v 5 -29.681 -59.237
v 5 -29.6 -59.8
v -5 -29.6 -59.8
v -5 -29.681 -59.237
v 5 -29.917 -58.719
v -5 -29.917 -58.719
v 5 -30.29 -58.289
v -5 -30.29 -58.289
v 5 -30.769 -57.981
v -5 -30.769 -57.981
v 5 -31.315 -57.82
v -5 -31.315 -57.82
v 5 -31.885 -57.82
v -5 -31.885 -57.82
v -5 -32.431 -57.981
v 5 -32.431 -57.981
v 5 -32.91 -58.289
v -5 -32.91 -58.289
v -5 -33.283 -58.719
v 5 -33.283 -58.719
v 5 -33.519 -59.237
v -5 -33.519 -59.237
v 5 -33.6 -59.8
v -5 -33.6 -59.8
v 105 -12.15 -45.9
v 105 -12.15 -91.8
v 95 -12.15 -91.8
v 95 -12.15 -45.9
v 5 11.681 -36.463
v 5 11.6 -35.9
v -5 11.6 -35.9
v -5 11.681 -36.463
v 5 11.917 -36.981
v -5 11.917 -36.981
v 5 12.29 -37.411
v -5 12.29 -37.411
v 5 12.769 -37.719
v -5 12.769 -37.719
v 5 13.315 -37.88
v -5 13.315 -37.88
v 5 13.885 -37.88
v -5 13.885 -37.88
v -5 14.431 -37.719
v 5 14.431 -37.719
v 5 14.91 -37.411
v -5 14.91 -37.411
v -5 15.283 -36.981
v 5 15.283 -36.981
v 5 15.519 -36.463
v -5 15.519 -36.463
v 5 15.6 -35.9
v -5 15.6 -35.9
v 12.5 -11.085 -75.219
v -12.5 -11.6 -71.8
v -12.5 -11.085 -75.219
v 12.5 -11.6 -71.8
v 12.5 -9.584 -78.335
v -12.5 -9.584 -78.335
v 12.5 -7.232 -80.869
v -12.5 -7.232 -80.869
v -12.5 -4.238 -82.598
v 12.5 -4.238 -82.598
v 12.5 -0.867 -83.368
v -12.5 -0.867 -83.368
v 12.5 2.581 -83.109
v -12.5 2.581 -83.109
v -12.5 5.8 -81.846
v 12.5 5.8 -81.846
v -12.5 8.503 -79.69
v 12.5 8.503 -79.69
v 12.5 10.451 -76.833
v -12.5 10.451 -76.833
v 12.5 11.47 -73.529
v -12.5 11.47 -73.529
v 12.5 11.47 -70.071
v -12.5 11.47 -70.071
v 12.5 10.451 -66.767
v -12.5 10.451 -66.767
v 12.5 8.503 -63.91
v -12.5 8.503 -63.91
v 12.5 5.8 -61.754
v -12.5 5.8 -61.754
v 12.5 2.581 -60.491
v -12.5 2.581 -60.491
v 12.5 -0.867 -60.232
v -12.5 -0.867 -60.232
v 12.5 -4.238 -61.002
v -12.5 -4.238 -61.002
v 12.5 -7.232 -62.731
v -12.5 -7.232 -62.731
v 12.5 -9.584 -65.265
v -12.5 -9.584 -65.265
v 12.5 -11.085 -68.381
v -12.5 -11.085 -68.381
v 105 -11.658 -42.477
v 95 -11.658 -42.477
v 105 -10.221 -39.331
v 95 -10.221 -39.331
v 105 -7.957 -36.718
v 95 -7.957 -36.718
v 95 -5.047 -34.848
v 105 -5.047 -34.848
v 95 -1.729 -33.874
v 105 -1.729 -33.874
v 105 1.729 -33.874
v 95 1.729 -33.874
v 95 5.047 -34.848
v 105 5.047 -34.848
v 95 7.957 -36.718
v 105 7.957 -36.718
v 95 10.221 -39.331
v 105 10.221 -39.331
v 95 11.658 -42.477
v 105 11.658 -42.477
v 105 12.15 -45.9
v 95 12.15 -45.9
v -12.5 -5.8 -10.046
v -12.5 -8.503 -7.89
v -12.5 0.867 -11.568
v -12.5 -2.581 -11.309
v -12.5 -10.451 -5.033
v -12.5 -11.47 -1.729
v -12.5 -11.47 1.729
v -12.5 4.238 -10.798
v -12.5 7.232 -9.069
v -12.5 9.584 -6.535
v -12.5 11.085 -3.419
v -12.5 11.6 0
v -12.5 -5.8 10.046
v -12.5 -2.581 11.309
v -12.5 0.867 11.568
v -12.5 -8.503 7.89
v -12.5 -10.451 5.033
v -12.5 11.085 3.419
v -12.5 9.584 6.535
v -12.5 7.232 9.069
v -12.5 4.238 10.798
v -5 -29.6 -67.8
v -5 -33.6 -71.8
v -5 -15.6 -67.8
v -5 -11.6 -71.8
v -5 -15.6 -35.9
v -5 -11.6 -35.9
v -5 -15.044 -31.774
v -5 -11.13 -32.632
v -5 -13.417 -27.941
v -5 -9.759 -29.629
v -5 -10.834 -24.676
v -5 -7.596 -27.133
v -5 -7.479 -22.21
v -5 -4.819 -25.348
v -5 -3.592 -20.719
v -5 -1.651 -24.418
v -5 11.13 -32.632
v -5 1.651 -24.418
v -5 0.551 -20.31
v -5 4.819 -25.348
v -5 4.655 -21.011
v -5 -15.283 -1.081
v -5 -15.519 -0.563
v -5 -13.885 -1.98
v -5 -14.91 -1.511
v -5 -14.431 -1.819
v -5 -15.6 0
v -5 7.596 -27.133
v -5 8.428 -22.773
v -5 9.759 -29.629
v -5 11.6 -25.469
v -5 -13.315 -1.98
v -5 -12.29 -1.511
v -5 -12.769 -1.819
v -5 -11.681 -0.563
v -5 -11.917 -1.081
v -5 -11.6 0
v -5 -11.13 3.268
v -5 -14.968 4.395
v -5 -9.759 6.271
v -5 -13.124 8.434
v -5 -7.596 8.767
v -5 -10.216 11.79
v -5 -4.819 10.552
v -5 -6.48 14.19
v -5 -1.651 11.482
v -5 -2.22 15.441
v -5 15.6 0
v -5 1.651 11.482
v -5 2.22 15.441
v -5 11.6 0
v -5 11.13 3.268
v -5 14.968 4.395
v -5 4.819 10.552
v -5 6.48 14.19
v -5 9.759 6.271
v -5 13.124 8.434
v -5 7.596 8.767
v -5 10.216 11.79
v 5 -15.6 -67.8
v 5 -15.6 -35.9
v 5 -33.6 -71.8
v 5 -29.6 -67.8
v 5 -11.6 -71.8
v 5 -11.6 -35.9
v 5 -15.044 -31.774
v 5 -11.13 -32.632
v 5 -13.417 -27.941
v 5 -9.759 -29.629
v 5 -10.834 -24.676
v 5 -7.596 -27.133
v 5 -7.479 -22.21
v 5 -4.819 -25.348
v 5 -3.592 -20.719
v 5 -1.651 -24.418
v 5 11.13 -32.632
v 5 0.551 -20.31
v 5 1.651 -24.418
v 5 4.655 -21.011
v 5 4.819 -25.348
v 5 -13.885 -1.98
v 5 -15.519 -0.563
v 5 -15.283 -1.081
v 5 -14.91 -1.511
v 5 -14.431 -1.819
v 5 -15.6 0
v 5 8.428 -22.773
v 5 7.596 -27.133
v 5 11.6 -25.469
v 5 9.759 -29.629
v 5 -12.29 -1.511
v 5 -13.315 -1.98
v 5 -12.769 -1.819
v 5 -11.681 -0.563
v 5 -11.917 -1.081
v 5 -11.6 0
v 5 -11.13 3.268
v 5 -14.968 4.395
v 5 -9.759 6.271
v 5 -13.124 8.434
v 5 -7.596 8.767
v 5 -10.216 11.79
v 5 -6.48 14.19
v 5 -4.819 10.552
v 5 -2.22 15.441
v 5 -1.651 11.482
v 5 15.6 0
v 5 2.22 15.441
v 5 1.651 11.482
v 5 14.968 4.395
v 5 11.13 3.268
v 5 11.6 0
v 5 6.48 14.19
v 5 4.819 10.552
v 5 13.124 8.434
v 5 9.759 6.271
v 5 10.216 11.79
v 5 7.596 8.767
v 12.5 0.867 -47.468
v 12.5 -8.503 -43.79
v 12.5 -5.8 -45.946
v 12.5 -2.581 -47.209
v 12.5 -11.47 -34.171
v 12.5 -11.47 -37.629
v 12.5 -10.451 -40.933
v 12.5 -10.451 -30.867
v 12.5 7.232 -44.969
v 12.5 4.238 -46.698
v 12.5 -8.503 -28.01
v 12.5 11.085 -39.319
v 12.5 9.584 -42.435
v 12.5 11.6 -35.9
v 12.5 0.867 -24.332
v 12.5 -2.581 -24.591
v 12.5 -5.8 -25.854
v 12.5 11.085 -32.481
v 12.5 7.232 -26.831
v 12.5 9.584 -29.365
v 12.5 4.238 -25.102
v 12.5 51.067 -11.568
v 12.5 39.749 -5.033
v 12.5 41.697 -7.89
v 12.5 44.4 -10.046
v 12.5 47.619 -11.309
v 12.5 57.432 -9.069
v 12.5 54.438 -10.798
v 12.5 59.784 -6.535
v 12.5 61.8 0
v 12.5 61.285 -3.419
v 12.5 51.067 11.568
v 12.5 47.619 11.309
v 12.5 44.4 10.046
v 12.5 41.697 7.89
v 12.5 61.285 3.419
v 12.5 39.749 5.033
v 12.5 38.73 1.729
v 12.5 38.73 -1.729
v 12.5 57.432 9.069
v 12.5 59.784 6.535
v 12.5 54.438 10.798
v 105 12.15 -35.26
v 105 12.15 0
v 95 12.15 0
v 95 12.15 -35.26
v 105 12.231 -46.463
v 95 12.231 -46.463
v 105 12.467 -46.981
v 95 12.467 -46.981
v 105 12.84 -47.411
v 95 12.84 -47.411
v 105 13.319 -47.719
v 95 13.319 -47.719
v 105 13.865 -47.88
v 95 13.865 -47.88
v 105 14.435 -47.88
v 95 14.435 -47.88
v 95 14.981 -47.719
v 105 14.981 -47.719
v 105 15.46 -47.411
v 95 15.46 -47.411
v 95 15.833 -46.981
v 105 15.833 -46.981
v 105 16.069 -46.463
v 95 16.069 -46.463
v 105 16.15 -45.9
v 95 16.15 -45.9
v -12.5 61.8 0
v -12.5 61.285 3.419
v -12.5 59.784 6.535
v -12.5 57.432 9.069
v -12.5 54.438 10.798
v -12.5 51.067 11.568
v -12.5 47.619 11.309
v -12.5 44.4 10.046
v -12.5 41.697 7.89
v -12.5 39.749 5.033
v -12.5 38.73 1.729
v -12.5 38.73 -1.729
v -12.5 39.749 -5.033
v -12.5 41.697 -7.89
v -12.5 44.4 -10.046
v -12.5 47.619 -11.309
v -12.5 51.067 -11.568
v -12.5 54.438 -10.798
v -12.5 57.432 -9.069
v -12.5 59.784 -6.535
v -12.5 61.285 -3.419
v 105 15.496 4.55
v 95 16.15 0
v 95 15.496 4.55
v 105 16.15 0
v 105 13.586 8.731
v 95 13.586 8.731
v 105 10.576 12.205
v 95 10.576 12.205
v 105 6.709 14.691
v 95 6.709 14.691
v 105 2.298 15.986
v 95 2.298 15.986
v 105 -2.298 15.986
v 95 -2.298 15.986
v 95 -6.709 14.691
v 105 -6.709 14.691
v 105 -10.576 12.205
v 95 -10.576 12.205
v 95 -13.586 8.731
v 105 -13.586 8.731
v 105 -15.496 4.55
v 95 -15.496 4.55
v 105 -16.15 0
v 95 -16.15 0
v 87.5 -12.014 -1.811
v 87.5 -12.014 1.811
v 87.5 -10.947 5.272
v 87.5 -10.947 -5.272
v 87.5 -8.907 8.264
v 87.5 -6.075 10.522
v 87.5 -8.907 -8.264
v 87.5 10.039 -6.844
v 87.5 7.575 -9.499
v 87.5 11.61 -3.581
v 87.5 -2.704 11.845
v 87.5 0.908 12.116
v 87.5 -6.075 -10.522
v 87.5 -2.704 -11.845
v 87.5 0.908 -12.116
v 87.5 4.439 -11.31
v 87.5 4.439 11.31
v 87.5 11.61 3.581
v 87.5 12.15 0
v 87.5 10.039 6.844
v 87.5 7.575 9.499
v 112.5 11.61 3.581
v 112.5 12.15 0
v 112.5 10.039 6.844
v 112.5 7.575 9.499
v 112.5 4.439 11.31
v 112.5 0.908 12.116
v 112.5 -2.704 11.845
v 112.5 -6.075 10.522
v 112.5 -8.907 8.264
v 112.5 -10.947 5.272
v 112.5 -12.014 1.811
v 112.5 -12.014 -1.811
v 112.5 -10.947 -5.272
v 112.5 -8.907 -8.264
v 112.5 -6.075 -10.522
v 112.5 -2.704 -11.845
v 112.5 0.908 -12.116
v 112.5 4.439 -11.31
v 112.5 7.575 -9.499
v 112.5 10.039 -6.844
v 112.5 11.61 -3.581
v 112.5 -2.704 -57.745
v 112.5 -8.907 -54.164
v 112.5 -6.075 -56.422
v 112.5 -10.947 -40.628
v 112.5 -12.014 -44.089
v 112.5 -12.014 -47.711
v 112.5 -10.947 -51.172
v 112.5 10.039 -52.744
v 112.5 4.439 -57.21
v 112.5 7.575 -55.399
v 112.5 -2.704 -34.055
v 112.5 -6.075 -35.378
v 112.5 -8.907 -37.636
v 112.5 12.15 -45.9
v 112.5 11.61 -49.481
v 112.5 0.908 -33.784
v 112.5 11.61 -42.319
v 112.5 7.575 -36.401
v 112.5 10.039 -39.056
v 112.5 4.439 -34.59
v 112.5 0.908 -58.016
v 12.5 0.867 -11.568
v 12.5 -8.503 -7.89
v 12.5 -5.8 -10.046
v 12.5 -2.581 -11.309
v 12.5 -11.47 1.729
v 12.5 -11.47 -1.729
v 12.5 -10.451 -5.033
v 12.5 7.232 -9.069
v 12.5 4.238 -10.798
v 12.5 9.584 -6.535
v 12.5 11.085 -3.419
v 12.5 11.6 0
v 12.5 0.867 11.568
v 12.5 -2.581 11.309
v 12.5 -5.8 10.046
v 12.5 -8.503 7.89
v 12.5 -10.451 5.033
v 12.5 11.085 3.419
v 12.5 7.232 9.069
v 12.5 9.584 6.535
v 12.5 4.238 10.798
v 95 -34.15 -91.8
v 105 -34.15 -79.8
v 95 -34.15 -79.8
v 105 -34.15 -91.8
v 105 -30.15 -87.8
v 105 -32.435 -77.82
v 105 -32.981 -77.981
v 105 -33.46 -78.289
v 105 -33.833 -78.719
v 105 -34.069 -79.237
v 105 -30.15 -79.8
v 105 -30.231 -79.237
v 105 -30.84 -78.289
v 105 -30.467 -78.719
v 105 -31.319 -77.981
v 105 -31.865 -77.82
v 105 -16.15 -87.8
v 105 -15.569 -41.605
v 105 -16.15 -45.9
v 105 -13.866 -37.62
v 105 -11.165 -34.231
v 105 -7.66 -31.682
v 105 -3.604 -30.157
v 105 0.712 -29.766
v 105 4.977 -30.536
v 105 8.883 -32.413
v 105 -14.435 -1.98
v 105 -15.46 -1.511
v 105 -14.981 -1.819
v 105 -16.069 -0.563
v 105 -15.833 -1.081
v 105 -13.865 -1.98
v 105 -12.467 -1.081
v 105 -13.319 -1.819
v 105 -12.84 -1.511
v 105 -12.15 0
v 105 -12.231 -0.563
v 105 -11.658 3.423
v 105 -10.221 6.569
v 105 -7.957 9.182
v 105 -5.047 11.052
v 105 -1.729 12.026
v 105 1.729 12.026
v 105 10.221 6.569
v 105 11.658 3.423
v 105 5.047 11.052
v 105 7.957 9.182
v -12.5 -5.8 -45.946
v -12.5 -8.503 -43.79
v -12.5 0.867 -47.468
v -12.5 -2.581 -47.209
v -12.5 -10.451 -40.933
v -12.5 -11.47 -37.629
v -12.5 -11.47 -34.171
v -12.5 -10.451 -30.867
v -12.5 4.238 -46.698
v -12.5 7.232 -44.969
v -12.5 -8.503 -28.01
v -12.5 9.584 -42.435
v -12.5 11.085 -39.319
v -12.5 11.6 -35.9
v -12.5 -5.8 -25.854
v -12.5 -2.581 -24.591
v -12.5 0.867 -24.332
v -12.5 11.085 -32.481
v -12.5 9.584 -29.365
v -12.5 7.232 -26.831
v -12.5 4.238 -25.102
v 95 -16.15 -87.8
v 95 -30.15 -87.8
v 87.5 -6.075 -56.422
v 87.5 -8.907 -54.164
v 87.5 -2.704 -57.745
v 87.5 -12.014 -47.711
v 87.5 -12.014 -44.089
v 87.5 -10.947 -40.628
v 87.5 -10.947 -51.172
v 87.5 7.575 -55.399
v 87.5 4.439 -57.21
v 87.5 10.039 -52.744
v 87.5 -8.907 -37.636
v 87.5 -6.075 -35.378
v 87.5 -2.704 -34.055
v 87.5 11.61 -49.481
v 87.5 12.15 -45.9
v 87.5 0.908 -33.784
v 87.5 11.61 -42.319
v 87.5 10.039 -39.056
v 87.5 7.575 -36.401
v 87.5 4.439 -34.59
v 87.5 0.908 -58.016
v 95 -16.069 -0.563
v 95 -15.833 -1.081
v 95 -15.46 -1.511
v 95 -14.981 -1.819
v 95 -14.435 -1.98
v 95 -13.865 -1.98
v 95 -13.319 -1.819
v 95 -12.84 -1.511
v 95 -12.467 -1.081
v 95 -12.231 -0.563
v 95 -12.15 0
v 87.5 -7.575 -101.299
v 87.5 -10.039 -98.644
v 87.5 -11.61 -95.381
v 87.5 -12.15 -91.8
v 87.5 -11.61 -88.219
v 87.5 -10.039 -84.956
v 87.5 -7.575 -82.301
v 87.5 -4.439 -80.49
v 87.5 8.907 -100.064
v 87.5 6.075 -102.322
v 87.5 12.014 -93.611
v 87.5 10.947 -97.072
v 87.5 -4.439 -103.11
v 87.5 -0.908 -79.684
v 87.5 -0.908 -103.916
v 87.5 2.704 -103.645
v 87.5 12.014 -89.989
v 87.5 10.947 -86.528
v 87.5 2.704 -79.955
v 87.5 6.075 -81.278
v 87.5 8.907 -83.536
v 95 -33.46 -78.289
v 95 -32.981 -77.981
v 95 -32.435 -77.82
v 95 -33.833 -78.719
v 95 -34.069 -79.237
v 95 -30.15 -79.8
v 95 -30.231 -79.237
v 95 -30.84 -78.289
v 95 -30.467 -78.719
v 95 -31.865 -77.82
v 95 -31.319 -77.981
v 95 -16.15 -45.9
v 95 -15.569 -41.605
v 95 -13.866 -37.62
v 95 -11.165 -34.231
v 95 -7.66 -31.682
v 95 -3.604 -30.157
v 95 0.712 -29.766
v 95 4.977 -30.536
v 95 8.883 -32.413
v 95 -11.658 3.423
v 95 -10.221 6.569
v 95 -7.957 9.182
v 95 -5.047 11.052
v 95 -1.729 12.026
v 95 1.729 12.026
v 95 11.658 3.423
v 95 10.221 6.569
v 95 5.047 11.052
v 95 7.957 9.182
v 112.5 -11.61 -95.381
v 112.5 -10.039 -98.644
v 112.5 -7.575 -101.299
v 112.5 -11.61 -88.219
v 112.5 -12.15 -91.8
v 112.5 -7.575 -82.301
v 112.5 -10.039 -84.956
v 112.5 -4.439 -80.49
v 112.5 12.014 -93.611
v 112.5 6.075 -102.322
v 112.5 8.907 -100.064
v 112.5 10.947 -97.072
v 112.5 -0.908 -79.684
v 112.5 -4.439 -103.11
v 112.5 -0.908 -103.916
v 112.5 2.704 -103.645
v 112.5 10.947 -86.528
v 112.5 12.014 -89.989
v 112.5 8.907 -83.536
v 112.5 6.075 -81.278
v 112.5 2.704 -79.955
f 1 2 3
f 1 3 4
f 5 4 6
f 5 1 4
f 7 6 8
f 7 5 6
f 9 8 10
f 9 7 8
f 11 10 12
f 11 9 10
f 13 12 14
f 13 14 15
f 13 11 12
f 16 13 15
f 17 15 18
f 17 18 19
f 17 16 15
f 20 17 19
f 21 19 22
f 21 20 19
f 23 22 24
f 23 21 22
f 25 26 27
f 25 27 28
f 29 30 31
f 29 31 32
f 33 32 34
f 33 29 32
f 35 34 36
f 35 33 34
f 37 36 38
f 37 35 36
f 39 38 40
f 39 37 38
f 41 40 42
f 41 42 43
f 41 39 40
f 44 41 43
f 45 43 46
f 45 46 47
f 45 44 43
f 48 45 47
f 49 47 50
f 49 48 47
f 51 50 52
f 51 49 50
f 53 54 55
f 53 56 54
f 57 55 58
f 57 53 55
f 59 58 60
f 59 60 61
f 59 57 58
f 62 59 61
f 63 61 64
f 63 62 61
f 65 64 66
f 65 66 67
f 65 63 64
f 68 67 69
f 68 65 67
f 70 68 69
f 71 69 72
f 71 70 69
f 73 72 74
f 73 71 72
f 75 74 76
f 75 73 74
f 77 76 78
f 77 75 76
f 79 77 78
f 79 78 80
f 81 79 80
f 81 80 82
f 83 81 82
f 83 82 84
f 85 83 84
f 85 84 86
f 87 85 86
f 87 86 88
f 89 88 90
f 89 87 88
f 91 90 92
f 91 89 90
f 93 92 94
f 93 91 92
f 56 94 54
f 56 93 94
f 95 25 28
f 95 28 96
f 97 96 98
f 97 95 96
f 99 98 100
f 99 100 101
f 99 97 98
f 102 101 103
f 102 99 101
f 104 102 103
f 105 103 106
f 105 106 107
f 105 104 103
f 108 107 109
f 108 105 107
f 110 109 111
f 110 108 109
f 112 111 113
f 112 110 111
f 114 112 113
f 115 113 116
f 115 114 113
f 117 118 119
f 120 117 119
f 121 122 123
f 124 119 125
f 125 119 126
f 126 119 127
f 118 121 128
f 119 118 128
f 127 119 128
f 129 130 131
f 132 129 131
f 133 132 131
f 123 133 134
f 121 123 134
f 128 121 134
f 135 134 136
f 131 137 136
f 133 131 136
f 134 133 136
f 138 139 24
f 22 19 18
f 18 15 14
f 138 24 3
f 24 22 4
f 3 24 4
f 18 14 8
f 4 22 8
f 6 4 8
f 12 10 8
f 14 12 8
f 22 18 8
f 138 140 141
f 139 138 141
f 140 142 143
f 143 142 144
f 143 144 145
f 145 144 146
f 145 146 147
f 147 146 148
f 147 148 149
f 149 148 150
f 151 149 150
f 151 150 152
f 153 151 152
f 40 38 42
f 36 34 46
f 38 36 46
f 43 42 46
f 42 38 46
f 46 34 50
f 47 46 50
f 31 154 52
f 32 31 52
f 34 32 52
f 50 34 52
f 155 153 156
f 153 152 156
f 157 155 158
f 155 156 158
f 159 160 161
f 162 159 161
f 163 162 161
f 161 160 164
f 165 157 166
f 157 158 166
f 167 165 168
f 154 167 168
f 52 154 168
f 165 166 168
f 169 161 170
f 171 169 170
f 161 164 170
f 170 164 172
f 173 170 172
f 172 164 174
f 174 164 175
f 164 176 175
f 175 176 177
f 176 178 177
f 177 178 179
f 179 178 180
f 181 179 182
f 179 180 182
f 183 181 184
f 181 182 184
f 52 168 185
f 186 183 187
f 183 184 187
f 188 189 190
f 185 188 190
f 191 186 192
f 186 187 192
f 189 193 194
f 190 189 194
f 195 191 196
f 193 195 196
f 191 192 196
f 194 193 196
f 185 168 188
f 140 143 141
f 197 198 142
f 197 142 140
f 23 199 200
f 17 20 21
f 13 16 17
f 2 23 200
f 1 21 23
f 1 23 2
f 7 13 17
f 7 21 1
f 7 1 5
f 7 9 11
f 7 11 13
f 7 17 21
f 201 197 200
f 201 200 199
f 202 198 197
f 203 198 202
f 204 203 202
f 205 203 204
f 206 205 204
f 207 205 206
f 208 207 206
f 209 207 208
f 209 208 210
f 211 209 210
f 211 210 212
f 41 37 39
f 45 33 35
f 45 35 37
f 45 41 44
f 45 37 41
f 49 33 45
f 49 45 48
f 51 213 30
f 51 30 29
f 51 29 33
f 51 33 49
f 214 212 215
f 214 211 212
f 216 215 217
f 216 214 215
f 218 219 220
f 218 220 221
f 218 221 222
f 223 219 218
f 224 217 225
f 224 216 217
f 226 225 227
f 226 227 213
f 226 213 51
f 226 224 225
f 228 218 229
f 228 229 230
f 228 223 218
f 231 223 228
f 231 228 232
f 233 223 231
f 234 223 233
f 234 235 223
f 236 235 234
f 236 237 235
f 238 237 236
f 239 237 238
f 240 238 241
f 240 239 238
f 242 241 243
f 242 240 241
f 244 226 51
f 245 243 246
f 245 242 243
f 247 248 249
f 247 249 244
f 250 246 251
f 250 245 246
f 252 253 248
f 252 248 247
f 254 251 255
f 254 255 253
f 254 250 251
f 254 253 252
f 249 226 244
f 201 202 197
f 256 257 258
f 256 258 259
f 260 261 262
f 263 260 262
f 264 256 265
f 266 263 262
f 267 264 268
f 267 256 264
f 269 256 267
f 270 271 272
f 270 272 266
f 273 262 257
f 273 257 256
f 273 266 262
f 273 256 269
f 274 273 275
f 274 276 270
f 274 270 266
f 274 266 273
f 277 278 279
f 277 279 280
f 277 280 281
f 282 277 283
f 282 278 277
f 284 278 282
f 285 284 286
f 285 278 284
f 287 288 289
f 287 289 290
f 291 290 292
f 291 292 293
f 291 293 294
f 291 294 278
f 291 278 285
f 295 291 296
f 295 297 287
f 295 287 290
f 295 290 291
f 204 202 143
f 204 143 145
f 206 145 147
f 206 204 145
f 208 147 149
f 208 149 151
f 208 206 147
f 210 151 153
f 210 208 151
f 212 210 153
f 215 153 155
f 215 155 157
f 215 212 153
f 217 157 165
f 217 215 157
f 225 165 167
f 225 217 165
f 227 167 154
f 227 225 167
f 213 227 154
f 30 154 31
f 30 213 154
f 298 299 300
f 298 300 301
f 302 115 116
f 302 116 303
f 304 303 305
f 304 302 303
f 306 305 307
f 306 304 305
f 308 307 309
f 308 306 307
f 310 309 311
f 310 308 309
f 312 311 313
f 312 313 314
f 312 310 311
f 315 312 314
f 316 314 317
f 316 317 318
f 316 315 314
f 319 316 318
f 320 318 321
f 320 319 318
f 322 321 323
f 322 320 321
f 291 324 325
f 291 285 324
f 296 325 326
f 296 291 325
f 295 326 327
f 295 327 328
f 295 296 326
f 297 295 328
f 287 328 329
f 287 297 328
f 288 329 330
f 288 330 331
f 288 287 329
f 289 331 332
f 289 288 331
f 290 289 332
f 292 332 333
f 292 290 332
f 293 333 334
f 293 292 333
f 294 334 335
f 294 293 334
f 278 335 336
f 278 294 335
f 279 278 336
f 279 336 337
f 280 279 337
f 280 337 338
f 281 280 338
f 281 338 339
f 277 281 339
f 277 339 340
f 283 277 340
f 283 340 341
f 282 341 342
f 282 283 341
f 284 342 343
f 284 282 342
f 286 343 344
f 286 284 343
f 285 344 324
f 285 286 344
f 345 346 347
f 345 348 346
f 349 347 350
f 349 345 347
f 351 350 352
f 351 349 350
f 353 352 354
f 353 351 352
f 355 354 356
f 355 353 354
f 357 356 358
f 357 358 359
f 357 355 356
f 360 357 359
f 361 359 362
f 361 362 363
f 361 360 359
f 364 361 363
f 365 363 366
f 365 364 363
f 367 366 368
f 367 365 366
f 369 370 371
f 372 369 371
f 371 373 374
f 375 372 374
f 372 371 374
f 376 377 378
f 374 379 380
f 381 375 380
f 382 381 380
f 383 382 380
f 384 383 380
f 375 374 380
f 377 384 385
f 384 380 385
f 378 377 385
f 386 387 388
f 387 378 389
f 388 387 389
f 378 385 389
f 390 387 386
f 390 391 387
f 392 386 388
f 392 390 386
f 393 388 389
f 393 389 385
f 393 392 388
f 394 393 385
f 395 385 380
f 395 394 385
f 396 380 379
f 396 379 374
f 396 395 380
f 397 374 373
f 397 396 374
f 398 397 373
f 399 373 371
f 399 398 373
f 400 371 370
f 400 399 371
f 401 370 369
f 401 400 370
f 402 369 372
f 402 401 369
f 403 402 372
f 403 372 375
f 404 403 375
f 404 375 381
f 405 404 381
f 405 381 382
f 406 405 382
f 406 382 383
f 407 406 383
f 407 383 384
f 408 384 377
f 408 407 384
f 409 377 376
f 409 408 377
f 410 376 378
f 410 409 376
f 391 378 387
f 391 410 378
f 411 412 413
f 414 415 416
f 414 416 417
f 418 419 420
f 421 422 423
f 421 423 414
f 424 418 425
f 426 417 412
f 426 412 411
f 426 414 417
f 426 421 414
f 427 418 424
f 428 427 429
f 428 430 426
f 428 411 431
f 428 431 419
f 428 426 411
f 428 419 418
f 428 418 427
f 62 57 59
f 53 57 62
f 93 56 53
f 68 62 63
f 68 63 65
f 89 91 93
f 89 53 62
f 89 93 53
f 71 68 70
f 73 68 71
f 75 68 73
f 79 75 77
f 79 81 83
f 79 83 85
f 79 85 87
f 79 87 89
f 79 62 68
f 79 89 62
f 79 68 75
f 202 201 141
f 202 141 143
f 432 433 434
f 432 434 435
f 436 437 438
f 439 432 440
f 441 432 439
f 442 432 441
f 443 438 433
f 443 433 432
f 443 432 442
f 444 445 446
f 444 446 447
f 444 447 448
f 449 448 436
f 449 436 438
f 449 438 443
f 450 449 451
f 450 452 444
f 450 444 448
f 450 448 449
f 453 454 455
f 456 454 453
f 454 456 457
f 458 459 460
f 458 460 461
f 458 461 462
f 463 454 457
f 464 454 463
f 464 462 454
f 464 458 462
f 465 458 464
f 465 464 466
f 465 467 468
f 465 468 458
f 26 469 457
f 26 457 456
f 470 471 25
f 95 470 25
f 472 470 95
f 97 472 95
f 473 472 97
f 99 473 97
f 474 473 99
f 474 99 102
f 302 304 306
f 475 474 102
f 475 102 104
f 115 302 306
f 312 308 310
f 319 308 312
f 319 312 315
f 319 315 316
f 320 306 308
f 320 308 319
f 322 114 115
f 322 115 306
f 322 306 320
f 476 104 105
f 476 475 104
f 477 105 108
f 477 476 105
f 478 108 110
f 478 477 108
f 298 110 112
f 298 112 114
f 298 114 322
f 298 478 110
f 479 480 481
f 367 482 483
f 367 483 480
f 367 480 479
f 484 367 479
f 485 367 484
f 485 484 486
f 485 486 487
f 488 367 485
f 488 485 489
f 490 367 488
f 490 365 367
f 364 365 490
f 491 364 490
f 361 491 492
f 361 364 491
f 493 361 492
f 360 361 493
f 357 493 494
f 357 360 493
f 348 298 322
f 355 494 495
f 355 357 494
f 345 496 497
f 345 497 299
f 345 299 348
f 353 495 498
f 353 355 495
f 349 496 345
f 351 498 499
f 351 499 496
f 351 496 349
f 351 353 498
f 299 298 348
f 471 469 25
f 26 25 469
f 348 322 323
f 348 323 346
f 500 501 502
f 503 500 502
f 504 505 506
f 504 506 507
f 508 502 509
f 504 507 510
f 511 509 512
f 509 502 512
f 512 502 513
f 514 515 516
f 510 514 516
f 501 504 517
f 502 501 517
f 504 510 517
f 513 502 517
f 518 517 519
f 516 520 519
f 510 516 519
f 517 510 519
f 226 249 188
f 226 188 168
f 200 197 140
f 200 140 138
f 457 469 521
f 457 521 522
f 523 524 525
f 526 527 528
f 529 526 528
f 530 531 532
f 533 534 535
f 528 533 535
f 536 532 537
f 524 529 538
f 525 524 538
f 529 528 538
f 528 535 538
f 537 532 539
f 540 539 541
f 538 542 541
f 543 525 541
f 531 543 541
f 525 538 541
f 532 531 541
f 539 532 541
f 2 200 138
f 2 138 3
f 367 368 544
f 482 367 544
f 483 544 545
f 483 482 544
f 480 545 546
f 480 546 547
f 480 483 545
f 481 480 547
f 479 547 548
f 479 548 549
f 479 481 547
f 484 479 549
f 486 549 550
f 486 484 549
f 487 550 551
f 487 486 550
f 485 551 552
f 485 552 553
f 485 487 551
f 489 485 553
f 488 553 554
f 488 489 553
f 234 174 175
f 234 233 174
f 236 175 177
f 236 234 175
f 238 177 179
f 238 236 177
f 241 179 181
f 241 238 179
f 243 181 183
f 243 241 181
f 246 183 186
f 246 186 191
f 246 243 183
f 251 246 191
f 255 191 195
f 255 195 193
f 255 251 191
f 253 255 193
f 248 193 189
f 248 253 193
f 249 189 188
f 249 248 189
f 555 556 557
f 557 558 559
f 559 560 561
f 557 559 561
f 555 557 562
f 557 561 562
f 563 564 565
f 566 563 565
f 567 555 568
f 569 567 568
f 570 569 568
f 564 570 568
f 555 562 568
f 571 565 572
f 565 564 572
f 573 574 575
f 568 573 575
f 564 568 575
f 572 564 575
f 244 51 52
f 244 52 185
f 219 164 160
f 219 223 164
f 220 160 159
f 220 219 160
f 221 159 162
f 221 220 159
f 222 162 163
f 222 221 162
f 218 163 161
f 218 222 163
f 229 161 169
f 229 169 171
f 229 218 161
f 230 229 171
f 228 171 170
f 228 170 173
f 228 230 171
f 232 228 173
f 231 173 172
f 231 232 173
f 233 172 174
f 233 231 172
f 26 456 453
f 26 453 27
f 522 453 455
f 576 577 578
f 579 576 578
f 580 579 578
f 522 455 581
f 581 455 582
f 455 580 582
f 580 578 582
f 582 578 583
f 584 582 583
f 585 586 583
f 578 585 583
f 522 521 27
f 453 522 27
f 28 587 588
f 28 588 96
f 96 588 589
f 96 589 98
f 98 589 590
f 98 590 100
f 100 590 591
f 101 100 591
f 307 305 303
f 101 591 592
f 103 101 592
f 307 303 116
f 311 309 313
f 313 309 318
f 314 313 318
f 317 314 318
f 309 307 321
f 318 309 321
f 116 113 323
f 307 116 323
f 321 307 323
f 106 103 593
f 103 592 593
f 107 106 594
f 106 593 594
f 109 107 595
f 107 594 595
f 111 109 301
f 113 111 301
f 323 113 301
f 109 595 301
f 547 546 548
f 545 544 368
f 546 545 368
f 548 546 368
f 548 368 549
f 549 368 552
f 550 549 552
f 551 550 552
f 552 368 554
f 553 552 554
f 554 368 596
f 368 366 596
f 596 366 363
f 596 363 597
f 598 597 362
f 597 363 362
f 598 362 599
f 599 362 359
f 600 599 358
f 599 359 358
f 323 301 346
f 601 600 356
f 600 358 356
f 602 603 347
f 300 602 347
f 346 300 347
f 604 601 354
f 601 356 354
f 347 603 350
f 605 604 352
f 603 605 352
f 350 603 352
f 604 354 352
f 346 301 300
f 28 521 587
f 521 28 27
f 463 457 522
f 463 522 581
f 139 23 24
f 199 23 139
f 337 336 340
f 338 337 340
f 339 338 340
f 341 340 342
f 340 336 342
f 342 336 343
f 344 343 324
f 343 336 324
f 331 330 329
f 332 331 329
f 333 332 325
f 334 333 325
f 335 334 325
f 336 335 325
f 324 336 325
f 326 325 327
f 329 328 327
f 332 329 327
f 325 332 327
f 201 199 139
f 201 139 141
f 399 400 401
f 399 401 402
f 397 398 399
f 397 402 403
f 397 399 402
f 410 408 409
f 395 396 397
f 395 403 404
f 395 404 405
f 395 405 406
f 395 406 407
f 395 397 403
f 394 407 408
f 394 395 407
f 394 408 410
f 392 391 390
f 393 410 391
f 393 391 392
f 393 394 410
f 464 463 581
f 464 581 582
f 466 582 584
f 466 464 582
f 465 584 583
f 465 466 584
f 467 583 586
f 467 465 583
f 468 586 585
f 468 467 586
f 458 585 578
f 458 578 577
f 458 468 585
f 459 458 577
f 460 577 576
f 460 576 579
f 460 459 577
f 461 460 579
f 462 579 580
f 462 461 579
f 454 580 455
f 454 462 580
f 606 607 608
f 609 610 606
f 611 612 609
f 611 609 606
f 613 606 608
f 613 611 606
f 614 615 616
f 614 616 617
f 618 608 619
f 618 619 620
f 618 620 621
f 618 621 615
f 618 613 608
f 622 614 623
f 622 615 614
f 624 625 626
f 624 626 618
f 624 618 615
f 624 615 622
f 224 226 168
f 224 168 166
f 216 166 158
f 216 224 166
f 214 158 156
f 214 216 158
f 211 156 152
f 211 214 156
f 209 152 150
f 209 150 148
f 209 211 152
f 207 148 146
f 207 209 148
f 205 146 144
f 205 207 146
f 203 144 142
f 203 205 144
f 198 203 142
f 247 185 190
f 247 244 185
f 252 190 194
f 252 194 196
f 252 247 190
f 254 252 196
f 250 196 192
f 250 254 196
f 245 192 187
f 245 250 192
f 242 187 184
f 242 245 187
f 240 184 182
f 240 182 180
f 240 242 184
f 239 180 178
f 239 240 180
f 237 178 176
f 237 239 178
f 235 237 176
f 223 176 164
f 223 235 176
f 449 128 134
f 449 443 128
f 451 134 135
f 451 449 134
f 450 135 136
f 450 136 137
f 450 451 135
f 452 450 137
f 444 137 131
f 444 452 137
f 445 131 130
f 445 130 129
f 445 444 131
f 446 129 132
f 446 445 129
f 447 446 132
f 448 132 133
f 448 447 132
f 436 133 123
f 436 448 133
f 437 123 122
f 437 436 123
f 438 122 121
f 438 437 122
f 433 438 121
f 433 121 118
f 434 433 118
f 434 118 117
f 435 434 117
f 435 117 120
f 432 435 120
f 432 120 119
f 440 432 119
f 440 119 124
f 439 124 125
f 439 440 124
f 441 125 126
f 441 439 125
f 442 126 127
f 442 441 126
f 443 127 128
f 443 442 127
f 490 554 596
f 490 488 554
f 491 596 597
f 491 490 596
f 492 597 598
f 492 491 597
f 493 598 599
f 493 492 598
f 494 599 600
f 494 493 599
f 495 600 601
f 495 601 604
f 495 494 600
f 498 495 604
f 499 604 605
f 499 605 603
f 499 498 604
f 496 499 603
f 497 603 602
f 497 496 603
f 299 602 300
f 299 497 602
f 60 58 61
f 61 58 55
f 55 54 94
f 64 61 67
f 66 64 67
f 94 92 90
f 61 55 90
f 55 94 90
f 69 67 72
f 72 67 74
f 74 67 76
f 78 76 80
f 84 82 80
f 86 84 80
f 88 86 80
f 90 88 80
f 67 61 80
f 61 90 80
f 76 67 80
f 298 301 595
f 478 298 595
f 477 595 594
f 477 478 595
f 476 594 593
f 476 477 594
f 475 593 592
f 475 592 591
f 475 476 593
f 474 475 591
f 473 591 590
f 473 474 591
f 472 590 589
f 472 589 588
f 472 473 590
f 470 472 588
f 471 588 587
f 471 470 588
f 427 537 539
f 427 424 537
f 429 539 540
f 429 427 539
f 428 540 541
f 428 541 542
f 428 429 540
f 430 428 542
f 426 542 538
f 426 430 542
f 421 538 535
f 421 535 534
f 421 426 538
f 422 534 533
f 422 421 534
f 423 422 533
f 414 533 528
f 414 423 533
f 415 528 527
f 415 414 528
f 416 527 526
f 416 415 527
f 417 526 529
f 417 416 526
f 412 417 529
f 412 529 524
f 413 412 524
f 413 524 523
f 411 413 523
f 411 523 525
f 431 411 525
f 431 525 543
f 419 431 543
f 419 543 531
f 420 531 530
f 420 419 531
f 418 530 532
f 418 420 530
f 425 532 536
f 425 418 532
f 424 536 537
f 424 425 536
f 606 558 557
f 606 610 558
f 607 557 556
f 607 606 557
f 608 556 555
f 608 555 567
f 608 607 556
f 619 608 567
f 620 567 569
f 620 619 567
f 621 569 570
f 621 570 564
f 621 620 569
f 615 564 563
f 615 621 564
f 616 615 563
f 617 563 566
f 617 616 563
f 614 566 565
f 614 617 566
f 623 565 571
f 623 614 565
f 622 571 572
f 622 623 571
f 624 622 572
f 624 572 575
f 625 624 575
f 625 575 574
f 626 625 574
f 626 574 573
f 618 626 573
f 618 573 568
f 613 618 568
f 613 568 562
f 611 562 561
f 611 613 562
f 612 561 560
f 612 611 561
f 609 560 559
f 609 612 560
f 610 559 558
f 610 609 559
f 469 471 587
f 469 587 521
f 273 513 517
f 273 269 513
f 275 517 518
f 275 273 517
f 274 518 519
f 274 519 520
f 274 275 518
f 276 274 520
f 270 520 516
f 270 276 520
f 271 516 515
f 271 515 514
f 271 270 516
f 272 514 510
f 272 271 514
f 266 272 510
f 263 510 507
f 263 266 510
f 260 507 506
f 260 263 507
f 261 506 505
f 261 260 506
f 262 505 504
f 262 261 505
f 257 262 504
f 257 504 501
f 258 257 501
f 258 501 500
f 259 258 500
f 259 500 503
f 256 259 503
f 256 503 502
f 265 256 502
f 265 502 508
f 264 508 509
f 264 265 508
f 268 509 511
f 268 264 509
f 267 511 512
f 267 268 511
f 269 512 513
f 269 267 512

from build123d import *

# Parameters (mm, degrees)
F0_R     = 11.6
F1_DEPTH = 12.5
F3_DEPTH = 5
F4_DEPTH = 12.5
F7_DEPTH = 12.5
F8_DEPTH = 5


with BuildPart() as f1:
    # F0 (on Right) → F1 (new body, symmetric)
    with BuildSketch(Plane.YZ):
        Circle(F0_R)
    extrude(amount=F1_DEPTH, both=True)


with BuildPart() as f1b:
    # F0 (on Right) → F1, piece 2 (new body, symmetric)
    with BuildSketch(Plane.YZ):
        with Locations((0, -35.9)):
            Circle(F0_R)
    extrude(amount=F1_DEPTH, both=True)


with BuildPart() as f1c:
    # F0 (on Right) → F1, piece 3 (new body, symmetric)
    with BuildSketch(Plane.YZ):
        with Locations((50.2, 0)):
            Circle(F0_R)
    extrude(amount=F1_DEPTH, both=True)


with BuildPart() as f3:
    # F2 (on Right) → F3 (new body, symmetric)
    with BuildSketch(Plane.YZ):
        with BuildLine():
            ThreePointArc((-11.6, 0), (0, 11.6), (11.6, 0))
            Line((11.6, 0), (11.6, -25.4692761517))
            ThreePointArc((11.6, -25.4692761517), (-5.5856960175, -21.3342868352), (-15.6, -35.9))
            Line((-15.6, -35.9), (-15.6, -67.8))
            Line((-15.6, -67.8), (-29.6, -67.8))
            Line((-29.6, -67.8), (-29.6, -59.8))
            ThreePointArc((-29.6, -59.8), (-31.6, -57.8), (-33.6, -59.8))
            Line((-33.6, -59.8), (-33.6, -71.8))
            Line((-33.6, -71.8), (-11.6, -71.8))
            Line((-11.6, -71.8), (-11.6, -35.9))
            ThreePointArc((-11.6, -35.9), (0, -24.3), (11.6, -35.9))
            ThreePointArc((11.6, -35.9), (13.6, -37.9), (15.6, -35.9))
            Line((15.6, -35.9), (15.6, 0))
            ThreePointArc((15.6, 0), (0, 15.6), (-15.6, 0))
            ThreePointArc((-15.6, 0), (-13.6, -2), (-11.6, 0))
        make_face()
    extrude(amount=F3_DEPTH, both=True)


with BuildPart() as f4:
    # F2 (on Right) → F4 (new body, symmetric)
    with BuildSketch(Plane.YZ):
        with BuildLine():
            ThreePointArc((11.6, -71.8), (0, -60.2), (-11.6, -71.8))
            ThreePointArc((-11.6, -71.8), (0, -83.4), (11.6, -71.8))
        make_face()
    extrude(amount=F4_DEPTH, both=True)


with BuildPart() as f7:
    # F6 (on offset) → F7 (new body, symmetric)
    with BuildSketch(Plane.YZ.offset(100)):
        with BuildLine():
            ThreePointArc((-12.15, 0), (0, -12.15), (12.15, 0))
            ThreePointArc((12.15, 0), (0, 12.15), (-12.15, 0))
        make_face()
    extrude(amount=F7_DEPTH, both=True)


with BuildPart() as f7b:
    # F6 (on offset) → F7, piece 2 (new body, symmetric)
    with BuildSketch(Plane.YZ.offset(100)):
        with BuildLine():
            ThreePointArc((-12.15, -45.9), (0, -58.05), (12.15, -45.9))
            ThreePointArc((12.15, -45.9), (0, -33.75), (-12.15, -45.9))
        make_face()
    extrude(amount=F7_DEPTH, both=True)


with BuildPart() as f7c:
    # F6 (on offset) → F7, piece 3 (new body, symmetric)
    with BuildSketch(Plane.YZ.offset(100)):
        with BuildLine():
            ThreePointArc((12.15, -91.8), (0, -79.65), (-12.15, -91.8))
            ThreePointArc((-12.15, -91.8), (0, -103.95), (12.15, -91.8))
        make_face()
    extrude(amount=F7_DEPTH, both=True)


with BuildPart() as f8:
    # F6 (on offset) → F8 (new body, symmetric)
    with BuildSketch(Plane.YZ.offset(100)):
        with BuildLine():
            ThreePointArc((-12.15, 0), (0, 12.15), (12.15, 0))
            Line((12.15, 0), (12.15, -35.2604511374))
            ThreePointArc((12.15, -35.2604511374), (-5.6833088954, -30.7830393266), (-16.15, -45.9))
            Line((-16.15, -45.9), (-16.15, -87.8))
            Line((-16.15, -87.8), (-30.15, -87.8))
            Line((-30.15, -87.8), (-30.15, -79.8))
            ThreePointArc((-30.15, -79.8), (-32.15, -77.8), (-34.15, -79.8))
            Line((-34.15, -79.8), (-34.15, -91.8))
            Line((-34.15, -91.8), (-12.15, -91.8))
            Line((-12.15, -91.8), (-12.15, -45.9))
            ThreePointArc((-12.15, -45.9), (0, -33.75), (12.15, -45.9))
            ThreePointArc((12.15, -45.9), (14.15, -47.9), (16.15, -45.9))
            Line((16.15, -45.9), (16.15, 0))
            ThreePointArc((16.15, 0), (0, 16.15), (-16.15, 0))
            ThreePointArc((-16.15, 0), (-14.15, -2), (-12.15, 0))
        make_face()
    extrude(amount=F8_DEPTH, both=True)


solid = Compound([f1.part, f1b.part, f1c.part, f3.part, f4.part, f7.part, f7b.part, f7c.part, f8.part])
